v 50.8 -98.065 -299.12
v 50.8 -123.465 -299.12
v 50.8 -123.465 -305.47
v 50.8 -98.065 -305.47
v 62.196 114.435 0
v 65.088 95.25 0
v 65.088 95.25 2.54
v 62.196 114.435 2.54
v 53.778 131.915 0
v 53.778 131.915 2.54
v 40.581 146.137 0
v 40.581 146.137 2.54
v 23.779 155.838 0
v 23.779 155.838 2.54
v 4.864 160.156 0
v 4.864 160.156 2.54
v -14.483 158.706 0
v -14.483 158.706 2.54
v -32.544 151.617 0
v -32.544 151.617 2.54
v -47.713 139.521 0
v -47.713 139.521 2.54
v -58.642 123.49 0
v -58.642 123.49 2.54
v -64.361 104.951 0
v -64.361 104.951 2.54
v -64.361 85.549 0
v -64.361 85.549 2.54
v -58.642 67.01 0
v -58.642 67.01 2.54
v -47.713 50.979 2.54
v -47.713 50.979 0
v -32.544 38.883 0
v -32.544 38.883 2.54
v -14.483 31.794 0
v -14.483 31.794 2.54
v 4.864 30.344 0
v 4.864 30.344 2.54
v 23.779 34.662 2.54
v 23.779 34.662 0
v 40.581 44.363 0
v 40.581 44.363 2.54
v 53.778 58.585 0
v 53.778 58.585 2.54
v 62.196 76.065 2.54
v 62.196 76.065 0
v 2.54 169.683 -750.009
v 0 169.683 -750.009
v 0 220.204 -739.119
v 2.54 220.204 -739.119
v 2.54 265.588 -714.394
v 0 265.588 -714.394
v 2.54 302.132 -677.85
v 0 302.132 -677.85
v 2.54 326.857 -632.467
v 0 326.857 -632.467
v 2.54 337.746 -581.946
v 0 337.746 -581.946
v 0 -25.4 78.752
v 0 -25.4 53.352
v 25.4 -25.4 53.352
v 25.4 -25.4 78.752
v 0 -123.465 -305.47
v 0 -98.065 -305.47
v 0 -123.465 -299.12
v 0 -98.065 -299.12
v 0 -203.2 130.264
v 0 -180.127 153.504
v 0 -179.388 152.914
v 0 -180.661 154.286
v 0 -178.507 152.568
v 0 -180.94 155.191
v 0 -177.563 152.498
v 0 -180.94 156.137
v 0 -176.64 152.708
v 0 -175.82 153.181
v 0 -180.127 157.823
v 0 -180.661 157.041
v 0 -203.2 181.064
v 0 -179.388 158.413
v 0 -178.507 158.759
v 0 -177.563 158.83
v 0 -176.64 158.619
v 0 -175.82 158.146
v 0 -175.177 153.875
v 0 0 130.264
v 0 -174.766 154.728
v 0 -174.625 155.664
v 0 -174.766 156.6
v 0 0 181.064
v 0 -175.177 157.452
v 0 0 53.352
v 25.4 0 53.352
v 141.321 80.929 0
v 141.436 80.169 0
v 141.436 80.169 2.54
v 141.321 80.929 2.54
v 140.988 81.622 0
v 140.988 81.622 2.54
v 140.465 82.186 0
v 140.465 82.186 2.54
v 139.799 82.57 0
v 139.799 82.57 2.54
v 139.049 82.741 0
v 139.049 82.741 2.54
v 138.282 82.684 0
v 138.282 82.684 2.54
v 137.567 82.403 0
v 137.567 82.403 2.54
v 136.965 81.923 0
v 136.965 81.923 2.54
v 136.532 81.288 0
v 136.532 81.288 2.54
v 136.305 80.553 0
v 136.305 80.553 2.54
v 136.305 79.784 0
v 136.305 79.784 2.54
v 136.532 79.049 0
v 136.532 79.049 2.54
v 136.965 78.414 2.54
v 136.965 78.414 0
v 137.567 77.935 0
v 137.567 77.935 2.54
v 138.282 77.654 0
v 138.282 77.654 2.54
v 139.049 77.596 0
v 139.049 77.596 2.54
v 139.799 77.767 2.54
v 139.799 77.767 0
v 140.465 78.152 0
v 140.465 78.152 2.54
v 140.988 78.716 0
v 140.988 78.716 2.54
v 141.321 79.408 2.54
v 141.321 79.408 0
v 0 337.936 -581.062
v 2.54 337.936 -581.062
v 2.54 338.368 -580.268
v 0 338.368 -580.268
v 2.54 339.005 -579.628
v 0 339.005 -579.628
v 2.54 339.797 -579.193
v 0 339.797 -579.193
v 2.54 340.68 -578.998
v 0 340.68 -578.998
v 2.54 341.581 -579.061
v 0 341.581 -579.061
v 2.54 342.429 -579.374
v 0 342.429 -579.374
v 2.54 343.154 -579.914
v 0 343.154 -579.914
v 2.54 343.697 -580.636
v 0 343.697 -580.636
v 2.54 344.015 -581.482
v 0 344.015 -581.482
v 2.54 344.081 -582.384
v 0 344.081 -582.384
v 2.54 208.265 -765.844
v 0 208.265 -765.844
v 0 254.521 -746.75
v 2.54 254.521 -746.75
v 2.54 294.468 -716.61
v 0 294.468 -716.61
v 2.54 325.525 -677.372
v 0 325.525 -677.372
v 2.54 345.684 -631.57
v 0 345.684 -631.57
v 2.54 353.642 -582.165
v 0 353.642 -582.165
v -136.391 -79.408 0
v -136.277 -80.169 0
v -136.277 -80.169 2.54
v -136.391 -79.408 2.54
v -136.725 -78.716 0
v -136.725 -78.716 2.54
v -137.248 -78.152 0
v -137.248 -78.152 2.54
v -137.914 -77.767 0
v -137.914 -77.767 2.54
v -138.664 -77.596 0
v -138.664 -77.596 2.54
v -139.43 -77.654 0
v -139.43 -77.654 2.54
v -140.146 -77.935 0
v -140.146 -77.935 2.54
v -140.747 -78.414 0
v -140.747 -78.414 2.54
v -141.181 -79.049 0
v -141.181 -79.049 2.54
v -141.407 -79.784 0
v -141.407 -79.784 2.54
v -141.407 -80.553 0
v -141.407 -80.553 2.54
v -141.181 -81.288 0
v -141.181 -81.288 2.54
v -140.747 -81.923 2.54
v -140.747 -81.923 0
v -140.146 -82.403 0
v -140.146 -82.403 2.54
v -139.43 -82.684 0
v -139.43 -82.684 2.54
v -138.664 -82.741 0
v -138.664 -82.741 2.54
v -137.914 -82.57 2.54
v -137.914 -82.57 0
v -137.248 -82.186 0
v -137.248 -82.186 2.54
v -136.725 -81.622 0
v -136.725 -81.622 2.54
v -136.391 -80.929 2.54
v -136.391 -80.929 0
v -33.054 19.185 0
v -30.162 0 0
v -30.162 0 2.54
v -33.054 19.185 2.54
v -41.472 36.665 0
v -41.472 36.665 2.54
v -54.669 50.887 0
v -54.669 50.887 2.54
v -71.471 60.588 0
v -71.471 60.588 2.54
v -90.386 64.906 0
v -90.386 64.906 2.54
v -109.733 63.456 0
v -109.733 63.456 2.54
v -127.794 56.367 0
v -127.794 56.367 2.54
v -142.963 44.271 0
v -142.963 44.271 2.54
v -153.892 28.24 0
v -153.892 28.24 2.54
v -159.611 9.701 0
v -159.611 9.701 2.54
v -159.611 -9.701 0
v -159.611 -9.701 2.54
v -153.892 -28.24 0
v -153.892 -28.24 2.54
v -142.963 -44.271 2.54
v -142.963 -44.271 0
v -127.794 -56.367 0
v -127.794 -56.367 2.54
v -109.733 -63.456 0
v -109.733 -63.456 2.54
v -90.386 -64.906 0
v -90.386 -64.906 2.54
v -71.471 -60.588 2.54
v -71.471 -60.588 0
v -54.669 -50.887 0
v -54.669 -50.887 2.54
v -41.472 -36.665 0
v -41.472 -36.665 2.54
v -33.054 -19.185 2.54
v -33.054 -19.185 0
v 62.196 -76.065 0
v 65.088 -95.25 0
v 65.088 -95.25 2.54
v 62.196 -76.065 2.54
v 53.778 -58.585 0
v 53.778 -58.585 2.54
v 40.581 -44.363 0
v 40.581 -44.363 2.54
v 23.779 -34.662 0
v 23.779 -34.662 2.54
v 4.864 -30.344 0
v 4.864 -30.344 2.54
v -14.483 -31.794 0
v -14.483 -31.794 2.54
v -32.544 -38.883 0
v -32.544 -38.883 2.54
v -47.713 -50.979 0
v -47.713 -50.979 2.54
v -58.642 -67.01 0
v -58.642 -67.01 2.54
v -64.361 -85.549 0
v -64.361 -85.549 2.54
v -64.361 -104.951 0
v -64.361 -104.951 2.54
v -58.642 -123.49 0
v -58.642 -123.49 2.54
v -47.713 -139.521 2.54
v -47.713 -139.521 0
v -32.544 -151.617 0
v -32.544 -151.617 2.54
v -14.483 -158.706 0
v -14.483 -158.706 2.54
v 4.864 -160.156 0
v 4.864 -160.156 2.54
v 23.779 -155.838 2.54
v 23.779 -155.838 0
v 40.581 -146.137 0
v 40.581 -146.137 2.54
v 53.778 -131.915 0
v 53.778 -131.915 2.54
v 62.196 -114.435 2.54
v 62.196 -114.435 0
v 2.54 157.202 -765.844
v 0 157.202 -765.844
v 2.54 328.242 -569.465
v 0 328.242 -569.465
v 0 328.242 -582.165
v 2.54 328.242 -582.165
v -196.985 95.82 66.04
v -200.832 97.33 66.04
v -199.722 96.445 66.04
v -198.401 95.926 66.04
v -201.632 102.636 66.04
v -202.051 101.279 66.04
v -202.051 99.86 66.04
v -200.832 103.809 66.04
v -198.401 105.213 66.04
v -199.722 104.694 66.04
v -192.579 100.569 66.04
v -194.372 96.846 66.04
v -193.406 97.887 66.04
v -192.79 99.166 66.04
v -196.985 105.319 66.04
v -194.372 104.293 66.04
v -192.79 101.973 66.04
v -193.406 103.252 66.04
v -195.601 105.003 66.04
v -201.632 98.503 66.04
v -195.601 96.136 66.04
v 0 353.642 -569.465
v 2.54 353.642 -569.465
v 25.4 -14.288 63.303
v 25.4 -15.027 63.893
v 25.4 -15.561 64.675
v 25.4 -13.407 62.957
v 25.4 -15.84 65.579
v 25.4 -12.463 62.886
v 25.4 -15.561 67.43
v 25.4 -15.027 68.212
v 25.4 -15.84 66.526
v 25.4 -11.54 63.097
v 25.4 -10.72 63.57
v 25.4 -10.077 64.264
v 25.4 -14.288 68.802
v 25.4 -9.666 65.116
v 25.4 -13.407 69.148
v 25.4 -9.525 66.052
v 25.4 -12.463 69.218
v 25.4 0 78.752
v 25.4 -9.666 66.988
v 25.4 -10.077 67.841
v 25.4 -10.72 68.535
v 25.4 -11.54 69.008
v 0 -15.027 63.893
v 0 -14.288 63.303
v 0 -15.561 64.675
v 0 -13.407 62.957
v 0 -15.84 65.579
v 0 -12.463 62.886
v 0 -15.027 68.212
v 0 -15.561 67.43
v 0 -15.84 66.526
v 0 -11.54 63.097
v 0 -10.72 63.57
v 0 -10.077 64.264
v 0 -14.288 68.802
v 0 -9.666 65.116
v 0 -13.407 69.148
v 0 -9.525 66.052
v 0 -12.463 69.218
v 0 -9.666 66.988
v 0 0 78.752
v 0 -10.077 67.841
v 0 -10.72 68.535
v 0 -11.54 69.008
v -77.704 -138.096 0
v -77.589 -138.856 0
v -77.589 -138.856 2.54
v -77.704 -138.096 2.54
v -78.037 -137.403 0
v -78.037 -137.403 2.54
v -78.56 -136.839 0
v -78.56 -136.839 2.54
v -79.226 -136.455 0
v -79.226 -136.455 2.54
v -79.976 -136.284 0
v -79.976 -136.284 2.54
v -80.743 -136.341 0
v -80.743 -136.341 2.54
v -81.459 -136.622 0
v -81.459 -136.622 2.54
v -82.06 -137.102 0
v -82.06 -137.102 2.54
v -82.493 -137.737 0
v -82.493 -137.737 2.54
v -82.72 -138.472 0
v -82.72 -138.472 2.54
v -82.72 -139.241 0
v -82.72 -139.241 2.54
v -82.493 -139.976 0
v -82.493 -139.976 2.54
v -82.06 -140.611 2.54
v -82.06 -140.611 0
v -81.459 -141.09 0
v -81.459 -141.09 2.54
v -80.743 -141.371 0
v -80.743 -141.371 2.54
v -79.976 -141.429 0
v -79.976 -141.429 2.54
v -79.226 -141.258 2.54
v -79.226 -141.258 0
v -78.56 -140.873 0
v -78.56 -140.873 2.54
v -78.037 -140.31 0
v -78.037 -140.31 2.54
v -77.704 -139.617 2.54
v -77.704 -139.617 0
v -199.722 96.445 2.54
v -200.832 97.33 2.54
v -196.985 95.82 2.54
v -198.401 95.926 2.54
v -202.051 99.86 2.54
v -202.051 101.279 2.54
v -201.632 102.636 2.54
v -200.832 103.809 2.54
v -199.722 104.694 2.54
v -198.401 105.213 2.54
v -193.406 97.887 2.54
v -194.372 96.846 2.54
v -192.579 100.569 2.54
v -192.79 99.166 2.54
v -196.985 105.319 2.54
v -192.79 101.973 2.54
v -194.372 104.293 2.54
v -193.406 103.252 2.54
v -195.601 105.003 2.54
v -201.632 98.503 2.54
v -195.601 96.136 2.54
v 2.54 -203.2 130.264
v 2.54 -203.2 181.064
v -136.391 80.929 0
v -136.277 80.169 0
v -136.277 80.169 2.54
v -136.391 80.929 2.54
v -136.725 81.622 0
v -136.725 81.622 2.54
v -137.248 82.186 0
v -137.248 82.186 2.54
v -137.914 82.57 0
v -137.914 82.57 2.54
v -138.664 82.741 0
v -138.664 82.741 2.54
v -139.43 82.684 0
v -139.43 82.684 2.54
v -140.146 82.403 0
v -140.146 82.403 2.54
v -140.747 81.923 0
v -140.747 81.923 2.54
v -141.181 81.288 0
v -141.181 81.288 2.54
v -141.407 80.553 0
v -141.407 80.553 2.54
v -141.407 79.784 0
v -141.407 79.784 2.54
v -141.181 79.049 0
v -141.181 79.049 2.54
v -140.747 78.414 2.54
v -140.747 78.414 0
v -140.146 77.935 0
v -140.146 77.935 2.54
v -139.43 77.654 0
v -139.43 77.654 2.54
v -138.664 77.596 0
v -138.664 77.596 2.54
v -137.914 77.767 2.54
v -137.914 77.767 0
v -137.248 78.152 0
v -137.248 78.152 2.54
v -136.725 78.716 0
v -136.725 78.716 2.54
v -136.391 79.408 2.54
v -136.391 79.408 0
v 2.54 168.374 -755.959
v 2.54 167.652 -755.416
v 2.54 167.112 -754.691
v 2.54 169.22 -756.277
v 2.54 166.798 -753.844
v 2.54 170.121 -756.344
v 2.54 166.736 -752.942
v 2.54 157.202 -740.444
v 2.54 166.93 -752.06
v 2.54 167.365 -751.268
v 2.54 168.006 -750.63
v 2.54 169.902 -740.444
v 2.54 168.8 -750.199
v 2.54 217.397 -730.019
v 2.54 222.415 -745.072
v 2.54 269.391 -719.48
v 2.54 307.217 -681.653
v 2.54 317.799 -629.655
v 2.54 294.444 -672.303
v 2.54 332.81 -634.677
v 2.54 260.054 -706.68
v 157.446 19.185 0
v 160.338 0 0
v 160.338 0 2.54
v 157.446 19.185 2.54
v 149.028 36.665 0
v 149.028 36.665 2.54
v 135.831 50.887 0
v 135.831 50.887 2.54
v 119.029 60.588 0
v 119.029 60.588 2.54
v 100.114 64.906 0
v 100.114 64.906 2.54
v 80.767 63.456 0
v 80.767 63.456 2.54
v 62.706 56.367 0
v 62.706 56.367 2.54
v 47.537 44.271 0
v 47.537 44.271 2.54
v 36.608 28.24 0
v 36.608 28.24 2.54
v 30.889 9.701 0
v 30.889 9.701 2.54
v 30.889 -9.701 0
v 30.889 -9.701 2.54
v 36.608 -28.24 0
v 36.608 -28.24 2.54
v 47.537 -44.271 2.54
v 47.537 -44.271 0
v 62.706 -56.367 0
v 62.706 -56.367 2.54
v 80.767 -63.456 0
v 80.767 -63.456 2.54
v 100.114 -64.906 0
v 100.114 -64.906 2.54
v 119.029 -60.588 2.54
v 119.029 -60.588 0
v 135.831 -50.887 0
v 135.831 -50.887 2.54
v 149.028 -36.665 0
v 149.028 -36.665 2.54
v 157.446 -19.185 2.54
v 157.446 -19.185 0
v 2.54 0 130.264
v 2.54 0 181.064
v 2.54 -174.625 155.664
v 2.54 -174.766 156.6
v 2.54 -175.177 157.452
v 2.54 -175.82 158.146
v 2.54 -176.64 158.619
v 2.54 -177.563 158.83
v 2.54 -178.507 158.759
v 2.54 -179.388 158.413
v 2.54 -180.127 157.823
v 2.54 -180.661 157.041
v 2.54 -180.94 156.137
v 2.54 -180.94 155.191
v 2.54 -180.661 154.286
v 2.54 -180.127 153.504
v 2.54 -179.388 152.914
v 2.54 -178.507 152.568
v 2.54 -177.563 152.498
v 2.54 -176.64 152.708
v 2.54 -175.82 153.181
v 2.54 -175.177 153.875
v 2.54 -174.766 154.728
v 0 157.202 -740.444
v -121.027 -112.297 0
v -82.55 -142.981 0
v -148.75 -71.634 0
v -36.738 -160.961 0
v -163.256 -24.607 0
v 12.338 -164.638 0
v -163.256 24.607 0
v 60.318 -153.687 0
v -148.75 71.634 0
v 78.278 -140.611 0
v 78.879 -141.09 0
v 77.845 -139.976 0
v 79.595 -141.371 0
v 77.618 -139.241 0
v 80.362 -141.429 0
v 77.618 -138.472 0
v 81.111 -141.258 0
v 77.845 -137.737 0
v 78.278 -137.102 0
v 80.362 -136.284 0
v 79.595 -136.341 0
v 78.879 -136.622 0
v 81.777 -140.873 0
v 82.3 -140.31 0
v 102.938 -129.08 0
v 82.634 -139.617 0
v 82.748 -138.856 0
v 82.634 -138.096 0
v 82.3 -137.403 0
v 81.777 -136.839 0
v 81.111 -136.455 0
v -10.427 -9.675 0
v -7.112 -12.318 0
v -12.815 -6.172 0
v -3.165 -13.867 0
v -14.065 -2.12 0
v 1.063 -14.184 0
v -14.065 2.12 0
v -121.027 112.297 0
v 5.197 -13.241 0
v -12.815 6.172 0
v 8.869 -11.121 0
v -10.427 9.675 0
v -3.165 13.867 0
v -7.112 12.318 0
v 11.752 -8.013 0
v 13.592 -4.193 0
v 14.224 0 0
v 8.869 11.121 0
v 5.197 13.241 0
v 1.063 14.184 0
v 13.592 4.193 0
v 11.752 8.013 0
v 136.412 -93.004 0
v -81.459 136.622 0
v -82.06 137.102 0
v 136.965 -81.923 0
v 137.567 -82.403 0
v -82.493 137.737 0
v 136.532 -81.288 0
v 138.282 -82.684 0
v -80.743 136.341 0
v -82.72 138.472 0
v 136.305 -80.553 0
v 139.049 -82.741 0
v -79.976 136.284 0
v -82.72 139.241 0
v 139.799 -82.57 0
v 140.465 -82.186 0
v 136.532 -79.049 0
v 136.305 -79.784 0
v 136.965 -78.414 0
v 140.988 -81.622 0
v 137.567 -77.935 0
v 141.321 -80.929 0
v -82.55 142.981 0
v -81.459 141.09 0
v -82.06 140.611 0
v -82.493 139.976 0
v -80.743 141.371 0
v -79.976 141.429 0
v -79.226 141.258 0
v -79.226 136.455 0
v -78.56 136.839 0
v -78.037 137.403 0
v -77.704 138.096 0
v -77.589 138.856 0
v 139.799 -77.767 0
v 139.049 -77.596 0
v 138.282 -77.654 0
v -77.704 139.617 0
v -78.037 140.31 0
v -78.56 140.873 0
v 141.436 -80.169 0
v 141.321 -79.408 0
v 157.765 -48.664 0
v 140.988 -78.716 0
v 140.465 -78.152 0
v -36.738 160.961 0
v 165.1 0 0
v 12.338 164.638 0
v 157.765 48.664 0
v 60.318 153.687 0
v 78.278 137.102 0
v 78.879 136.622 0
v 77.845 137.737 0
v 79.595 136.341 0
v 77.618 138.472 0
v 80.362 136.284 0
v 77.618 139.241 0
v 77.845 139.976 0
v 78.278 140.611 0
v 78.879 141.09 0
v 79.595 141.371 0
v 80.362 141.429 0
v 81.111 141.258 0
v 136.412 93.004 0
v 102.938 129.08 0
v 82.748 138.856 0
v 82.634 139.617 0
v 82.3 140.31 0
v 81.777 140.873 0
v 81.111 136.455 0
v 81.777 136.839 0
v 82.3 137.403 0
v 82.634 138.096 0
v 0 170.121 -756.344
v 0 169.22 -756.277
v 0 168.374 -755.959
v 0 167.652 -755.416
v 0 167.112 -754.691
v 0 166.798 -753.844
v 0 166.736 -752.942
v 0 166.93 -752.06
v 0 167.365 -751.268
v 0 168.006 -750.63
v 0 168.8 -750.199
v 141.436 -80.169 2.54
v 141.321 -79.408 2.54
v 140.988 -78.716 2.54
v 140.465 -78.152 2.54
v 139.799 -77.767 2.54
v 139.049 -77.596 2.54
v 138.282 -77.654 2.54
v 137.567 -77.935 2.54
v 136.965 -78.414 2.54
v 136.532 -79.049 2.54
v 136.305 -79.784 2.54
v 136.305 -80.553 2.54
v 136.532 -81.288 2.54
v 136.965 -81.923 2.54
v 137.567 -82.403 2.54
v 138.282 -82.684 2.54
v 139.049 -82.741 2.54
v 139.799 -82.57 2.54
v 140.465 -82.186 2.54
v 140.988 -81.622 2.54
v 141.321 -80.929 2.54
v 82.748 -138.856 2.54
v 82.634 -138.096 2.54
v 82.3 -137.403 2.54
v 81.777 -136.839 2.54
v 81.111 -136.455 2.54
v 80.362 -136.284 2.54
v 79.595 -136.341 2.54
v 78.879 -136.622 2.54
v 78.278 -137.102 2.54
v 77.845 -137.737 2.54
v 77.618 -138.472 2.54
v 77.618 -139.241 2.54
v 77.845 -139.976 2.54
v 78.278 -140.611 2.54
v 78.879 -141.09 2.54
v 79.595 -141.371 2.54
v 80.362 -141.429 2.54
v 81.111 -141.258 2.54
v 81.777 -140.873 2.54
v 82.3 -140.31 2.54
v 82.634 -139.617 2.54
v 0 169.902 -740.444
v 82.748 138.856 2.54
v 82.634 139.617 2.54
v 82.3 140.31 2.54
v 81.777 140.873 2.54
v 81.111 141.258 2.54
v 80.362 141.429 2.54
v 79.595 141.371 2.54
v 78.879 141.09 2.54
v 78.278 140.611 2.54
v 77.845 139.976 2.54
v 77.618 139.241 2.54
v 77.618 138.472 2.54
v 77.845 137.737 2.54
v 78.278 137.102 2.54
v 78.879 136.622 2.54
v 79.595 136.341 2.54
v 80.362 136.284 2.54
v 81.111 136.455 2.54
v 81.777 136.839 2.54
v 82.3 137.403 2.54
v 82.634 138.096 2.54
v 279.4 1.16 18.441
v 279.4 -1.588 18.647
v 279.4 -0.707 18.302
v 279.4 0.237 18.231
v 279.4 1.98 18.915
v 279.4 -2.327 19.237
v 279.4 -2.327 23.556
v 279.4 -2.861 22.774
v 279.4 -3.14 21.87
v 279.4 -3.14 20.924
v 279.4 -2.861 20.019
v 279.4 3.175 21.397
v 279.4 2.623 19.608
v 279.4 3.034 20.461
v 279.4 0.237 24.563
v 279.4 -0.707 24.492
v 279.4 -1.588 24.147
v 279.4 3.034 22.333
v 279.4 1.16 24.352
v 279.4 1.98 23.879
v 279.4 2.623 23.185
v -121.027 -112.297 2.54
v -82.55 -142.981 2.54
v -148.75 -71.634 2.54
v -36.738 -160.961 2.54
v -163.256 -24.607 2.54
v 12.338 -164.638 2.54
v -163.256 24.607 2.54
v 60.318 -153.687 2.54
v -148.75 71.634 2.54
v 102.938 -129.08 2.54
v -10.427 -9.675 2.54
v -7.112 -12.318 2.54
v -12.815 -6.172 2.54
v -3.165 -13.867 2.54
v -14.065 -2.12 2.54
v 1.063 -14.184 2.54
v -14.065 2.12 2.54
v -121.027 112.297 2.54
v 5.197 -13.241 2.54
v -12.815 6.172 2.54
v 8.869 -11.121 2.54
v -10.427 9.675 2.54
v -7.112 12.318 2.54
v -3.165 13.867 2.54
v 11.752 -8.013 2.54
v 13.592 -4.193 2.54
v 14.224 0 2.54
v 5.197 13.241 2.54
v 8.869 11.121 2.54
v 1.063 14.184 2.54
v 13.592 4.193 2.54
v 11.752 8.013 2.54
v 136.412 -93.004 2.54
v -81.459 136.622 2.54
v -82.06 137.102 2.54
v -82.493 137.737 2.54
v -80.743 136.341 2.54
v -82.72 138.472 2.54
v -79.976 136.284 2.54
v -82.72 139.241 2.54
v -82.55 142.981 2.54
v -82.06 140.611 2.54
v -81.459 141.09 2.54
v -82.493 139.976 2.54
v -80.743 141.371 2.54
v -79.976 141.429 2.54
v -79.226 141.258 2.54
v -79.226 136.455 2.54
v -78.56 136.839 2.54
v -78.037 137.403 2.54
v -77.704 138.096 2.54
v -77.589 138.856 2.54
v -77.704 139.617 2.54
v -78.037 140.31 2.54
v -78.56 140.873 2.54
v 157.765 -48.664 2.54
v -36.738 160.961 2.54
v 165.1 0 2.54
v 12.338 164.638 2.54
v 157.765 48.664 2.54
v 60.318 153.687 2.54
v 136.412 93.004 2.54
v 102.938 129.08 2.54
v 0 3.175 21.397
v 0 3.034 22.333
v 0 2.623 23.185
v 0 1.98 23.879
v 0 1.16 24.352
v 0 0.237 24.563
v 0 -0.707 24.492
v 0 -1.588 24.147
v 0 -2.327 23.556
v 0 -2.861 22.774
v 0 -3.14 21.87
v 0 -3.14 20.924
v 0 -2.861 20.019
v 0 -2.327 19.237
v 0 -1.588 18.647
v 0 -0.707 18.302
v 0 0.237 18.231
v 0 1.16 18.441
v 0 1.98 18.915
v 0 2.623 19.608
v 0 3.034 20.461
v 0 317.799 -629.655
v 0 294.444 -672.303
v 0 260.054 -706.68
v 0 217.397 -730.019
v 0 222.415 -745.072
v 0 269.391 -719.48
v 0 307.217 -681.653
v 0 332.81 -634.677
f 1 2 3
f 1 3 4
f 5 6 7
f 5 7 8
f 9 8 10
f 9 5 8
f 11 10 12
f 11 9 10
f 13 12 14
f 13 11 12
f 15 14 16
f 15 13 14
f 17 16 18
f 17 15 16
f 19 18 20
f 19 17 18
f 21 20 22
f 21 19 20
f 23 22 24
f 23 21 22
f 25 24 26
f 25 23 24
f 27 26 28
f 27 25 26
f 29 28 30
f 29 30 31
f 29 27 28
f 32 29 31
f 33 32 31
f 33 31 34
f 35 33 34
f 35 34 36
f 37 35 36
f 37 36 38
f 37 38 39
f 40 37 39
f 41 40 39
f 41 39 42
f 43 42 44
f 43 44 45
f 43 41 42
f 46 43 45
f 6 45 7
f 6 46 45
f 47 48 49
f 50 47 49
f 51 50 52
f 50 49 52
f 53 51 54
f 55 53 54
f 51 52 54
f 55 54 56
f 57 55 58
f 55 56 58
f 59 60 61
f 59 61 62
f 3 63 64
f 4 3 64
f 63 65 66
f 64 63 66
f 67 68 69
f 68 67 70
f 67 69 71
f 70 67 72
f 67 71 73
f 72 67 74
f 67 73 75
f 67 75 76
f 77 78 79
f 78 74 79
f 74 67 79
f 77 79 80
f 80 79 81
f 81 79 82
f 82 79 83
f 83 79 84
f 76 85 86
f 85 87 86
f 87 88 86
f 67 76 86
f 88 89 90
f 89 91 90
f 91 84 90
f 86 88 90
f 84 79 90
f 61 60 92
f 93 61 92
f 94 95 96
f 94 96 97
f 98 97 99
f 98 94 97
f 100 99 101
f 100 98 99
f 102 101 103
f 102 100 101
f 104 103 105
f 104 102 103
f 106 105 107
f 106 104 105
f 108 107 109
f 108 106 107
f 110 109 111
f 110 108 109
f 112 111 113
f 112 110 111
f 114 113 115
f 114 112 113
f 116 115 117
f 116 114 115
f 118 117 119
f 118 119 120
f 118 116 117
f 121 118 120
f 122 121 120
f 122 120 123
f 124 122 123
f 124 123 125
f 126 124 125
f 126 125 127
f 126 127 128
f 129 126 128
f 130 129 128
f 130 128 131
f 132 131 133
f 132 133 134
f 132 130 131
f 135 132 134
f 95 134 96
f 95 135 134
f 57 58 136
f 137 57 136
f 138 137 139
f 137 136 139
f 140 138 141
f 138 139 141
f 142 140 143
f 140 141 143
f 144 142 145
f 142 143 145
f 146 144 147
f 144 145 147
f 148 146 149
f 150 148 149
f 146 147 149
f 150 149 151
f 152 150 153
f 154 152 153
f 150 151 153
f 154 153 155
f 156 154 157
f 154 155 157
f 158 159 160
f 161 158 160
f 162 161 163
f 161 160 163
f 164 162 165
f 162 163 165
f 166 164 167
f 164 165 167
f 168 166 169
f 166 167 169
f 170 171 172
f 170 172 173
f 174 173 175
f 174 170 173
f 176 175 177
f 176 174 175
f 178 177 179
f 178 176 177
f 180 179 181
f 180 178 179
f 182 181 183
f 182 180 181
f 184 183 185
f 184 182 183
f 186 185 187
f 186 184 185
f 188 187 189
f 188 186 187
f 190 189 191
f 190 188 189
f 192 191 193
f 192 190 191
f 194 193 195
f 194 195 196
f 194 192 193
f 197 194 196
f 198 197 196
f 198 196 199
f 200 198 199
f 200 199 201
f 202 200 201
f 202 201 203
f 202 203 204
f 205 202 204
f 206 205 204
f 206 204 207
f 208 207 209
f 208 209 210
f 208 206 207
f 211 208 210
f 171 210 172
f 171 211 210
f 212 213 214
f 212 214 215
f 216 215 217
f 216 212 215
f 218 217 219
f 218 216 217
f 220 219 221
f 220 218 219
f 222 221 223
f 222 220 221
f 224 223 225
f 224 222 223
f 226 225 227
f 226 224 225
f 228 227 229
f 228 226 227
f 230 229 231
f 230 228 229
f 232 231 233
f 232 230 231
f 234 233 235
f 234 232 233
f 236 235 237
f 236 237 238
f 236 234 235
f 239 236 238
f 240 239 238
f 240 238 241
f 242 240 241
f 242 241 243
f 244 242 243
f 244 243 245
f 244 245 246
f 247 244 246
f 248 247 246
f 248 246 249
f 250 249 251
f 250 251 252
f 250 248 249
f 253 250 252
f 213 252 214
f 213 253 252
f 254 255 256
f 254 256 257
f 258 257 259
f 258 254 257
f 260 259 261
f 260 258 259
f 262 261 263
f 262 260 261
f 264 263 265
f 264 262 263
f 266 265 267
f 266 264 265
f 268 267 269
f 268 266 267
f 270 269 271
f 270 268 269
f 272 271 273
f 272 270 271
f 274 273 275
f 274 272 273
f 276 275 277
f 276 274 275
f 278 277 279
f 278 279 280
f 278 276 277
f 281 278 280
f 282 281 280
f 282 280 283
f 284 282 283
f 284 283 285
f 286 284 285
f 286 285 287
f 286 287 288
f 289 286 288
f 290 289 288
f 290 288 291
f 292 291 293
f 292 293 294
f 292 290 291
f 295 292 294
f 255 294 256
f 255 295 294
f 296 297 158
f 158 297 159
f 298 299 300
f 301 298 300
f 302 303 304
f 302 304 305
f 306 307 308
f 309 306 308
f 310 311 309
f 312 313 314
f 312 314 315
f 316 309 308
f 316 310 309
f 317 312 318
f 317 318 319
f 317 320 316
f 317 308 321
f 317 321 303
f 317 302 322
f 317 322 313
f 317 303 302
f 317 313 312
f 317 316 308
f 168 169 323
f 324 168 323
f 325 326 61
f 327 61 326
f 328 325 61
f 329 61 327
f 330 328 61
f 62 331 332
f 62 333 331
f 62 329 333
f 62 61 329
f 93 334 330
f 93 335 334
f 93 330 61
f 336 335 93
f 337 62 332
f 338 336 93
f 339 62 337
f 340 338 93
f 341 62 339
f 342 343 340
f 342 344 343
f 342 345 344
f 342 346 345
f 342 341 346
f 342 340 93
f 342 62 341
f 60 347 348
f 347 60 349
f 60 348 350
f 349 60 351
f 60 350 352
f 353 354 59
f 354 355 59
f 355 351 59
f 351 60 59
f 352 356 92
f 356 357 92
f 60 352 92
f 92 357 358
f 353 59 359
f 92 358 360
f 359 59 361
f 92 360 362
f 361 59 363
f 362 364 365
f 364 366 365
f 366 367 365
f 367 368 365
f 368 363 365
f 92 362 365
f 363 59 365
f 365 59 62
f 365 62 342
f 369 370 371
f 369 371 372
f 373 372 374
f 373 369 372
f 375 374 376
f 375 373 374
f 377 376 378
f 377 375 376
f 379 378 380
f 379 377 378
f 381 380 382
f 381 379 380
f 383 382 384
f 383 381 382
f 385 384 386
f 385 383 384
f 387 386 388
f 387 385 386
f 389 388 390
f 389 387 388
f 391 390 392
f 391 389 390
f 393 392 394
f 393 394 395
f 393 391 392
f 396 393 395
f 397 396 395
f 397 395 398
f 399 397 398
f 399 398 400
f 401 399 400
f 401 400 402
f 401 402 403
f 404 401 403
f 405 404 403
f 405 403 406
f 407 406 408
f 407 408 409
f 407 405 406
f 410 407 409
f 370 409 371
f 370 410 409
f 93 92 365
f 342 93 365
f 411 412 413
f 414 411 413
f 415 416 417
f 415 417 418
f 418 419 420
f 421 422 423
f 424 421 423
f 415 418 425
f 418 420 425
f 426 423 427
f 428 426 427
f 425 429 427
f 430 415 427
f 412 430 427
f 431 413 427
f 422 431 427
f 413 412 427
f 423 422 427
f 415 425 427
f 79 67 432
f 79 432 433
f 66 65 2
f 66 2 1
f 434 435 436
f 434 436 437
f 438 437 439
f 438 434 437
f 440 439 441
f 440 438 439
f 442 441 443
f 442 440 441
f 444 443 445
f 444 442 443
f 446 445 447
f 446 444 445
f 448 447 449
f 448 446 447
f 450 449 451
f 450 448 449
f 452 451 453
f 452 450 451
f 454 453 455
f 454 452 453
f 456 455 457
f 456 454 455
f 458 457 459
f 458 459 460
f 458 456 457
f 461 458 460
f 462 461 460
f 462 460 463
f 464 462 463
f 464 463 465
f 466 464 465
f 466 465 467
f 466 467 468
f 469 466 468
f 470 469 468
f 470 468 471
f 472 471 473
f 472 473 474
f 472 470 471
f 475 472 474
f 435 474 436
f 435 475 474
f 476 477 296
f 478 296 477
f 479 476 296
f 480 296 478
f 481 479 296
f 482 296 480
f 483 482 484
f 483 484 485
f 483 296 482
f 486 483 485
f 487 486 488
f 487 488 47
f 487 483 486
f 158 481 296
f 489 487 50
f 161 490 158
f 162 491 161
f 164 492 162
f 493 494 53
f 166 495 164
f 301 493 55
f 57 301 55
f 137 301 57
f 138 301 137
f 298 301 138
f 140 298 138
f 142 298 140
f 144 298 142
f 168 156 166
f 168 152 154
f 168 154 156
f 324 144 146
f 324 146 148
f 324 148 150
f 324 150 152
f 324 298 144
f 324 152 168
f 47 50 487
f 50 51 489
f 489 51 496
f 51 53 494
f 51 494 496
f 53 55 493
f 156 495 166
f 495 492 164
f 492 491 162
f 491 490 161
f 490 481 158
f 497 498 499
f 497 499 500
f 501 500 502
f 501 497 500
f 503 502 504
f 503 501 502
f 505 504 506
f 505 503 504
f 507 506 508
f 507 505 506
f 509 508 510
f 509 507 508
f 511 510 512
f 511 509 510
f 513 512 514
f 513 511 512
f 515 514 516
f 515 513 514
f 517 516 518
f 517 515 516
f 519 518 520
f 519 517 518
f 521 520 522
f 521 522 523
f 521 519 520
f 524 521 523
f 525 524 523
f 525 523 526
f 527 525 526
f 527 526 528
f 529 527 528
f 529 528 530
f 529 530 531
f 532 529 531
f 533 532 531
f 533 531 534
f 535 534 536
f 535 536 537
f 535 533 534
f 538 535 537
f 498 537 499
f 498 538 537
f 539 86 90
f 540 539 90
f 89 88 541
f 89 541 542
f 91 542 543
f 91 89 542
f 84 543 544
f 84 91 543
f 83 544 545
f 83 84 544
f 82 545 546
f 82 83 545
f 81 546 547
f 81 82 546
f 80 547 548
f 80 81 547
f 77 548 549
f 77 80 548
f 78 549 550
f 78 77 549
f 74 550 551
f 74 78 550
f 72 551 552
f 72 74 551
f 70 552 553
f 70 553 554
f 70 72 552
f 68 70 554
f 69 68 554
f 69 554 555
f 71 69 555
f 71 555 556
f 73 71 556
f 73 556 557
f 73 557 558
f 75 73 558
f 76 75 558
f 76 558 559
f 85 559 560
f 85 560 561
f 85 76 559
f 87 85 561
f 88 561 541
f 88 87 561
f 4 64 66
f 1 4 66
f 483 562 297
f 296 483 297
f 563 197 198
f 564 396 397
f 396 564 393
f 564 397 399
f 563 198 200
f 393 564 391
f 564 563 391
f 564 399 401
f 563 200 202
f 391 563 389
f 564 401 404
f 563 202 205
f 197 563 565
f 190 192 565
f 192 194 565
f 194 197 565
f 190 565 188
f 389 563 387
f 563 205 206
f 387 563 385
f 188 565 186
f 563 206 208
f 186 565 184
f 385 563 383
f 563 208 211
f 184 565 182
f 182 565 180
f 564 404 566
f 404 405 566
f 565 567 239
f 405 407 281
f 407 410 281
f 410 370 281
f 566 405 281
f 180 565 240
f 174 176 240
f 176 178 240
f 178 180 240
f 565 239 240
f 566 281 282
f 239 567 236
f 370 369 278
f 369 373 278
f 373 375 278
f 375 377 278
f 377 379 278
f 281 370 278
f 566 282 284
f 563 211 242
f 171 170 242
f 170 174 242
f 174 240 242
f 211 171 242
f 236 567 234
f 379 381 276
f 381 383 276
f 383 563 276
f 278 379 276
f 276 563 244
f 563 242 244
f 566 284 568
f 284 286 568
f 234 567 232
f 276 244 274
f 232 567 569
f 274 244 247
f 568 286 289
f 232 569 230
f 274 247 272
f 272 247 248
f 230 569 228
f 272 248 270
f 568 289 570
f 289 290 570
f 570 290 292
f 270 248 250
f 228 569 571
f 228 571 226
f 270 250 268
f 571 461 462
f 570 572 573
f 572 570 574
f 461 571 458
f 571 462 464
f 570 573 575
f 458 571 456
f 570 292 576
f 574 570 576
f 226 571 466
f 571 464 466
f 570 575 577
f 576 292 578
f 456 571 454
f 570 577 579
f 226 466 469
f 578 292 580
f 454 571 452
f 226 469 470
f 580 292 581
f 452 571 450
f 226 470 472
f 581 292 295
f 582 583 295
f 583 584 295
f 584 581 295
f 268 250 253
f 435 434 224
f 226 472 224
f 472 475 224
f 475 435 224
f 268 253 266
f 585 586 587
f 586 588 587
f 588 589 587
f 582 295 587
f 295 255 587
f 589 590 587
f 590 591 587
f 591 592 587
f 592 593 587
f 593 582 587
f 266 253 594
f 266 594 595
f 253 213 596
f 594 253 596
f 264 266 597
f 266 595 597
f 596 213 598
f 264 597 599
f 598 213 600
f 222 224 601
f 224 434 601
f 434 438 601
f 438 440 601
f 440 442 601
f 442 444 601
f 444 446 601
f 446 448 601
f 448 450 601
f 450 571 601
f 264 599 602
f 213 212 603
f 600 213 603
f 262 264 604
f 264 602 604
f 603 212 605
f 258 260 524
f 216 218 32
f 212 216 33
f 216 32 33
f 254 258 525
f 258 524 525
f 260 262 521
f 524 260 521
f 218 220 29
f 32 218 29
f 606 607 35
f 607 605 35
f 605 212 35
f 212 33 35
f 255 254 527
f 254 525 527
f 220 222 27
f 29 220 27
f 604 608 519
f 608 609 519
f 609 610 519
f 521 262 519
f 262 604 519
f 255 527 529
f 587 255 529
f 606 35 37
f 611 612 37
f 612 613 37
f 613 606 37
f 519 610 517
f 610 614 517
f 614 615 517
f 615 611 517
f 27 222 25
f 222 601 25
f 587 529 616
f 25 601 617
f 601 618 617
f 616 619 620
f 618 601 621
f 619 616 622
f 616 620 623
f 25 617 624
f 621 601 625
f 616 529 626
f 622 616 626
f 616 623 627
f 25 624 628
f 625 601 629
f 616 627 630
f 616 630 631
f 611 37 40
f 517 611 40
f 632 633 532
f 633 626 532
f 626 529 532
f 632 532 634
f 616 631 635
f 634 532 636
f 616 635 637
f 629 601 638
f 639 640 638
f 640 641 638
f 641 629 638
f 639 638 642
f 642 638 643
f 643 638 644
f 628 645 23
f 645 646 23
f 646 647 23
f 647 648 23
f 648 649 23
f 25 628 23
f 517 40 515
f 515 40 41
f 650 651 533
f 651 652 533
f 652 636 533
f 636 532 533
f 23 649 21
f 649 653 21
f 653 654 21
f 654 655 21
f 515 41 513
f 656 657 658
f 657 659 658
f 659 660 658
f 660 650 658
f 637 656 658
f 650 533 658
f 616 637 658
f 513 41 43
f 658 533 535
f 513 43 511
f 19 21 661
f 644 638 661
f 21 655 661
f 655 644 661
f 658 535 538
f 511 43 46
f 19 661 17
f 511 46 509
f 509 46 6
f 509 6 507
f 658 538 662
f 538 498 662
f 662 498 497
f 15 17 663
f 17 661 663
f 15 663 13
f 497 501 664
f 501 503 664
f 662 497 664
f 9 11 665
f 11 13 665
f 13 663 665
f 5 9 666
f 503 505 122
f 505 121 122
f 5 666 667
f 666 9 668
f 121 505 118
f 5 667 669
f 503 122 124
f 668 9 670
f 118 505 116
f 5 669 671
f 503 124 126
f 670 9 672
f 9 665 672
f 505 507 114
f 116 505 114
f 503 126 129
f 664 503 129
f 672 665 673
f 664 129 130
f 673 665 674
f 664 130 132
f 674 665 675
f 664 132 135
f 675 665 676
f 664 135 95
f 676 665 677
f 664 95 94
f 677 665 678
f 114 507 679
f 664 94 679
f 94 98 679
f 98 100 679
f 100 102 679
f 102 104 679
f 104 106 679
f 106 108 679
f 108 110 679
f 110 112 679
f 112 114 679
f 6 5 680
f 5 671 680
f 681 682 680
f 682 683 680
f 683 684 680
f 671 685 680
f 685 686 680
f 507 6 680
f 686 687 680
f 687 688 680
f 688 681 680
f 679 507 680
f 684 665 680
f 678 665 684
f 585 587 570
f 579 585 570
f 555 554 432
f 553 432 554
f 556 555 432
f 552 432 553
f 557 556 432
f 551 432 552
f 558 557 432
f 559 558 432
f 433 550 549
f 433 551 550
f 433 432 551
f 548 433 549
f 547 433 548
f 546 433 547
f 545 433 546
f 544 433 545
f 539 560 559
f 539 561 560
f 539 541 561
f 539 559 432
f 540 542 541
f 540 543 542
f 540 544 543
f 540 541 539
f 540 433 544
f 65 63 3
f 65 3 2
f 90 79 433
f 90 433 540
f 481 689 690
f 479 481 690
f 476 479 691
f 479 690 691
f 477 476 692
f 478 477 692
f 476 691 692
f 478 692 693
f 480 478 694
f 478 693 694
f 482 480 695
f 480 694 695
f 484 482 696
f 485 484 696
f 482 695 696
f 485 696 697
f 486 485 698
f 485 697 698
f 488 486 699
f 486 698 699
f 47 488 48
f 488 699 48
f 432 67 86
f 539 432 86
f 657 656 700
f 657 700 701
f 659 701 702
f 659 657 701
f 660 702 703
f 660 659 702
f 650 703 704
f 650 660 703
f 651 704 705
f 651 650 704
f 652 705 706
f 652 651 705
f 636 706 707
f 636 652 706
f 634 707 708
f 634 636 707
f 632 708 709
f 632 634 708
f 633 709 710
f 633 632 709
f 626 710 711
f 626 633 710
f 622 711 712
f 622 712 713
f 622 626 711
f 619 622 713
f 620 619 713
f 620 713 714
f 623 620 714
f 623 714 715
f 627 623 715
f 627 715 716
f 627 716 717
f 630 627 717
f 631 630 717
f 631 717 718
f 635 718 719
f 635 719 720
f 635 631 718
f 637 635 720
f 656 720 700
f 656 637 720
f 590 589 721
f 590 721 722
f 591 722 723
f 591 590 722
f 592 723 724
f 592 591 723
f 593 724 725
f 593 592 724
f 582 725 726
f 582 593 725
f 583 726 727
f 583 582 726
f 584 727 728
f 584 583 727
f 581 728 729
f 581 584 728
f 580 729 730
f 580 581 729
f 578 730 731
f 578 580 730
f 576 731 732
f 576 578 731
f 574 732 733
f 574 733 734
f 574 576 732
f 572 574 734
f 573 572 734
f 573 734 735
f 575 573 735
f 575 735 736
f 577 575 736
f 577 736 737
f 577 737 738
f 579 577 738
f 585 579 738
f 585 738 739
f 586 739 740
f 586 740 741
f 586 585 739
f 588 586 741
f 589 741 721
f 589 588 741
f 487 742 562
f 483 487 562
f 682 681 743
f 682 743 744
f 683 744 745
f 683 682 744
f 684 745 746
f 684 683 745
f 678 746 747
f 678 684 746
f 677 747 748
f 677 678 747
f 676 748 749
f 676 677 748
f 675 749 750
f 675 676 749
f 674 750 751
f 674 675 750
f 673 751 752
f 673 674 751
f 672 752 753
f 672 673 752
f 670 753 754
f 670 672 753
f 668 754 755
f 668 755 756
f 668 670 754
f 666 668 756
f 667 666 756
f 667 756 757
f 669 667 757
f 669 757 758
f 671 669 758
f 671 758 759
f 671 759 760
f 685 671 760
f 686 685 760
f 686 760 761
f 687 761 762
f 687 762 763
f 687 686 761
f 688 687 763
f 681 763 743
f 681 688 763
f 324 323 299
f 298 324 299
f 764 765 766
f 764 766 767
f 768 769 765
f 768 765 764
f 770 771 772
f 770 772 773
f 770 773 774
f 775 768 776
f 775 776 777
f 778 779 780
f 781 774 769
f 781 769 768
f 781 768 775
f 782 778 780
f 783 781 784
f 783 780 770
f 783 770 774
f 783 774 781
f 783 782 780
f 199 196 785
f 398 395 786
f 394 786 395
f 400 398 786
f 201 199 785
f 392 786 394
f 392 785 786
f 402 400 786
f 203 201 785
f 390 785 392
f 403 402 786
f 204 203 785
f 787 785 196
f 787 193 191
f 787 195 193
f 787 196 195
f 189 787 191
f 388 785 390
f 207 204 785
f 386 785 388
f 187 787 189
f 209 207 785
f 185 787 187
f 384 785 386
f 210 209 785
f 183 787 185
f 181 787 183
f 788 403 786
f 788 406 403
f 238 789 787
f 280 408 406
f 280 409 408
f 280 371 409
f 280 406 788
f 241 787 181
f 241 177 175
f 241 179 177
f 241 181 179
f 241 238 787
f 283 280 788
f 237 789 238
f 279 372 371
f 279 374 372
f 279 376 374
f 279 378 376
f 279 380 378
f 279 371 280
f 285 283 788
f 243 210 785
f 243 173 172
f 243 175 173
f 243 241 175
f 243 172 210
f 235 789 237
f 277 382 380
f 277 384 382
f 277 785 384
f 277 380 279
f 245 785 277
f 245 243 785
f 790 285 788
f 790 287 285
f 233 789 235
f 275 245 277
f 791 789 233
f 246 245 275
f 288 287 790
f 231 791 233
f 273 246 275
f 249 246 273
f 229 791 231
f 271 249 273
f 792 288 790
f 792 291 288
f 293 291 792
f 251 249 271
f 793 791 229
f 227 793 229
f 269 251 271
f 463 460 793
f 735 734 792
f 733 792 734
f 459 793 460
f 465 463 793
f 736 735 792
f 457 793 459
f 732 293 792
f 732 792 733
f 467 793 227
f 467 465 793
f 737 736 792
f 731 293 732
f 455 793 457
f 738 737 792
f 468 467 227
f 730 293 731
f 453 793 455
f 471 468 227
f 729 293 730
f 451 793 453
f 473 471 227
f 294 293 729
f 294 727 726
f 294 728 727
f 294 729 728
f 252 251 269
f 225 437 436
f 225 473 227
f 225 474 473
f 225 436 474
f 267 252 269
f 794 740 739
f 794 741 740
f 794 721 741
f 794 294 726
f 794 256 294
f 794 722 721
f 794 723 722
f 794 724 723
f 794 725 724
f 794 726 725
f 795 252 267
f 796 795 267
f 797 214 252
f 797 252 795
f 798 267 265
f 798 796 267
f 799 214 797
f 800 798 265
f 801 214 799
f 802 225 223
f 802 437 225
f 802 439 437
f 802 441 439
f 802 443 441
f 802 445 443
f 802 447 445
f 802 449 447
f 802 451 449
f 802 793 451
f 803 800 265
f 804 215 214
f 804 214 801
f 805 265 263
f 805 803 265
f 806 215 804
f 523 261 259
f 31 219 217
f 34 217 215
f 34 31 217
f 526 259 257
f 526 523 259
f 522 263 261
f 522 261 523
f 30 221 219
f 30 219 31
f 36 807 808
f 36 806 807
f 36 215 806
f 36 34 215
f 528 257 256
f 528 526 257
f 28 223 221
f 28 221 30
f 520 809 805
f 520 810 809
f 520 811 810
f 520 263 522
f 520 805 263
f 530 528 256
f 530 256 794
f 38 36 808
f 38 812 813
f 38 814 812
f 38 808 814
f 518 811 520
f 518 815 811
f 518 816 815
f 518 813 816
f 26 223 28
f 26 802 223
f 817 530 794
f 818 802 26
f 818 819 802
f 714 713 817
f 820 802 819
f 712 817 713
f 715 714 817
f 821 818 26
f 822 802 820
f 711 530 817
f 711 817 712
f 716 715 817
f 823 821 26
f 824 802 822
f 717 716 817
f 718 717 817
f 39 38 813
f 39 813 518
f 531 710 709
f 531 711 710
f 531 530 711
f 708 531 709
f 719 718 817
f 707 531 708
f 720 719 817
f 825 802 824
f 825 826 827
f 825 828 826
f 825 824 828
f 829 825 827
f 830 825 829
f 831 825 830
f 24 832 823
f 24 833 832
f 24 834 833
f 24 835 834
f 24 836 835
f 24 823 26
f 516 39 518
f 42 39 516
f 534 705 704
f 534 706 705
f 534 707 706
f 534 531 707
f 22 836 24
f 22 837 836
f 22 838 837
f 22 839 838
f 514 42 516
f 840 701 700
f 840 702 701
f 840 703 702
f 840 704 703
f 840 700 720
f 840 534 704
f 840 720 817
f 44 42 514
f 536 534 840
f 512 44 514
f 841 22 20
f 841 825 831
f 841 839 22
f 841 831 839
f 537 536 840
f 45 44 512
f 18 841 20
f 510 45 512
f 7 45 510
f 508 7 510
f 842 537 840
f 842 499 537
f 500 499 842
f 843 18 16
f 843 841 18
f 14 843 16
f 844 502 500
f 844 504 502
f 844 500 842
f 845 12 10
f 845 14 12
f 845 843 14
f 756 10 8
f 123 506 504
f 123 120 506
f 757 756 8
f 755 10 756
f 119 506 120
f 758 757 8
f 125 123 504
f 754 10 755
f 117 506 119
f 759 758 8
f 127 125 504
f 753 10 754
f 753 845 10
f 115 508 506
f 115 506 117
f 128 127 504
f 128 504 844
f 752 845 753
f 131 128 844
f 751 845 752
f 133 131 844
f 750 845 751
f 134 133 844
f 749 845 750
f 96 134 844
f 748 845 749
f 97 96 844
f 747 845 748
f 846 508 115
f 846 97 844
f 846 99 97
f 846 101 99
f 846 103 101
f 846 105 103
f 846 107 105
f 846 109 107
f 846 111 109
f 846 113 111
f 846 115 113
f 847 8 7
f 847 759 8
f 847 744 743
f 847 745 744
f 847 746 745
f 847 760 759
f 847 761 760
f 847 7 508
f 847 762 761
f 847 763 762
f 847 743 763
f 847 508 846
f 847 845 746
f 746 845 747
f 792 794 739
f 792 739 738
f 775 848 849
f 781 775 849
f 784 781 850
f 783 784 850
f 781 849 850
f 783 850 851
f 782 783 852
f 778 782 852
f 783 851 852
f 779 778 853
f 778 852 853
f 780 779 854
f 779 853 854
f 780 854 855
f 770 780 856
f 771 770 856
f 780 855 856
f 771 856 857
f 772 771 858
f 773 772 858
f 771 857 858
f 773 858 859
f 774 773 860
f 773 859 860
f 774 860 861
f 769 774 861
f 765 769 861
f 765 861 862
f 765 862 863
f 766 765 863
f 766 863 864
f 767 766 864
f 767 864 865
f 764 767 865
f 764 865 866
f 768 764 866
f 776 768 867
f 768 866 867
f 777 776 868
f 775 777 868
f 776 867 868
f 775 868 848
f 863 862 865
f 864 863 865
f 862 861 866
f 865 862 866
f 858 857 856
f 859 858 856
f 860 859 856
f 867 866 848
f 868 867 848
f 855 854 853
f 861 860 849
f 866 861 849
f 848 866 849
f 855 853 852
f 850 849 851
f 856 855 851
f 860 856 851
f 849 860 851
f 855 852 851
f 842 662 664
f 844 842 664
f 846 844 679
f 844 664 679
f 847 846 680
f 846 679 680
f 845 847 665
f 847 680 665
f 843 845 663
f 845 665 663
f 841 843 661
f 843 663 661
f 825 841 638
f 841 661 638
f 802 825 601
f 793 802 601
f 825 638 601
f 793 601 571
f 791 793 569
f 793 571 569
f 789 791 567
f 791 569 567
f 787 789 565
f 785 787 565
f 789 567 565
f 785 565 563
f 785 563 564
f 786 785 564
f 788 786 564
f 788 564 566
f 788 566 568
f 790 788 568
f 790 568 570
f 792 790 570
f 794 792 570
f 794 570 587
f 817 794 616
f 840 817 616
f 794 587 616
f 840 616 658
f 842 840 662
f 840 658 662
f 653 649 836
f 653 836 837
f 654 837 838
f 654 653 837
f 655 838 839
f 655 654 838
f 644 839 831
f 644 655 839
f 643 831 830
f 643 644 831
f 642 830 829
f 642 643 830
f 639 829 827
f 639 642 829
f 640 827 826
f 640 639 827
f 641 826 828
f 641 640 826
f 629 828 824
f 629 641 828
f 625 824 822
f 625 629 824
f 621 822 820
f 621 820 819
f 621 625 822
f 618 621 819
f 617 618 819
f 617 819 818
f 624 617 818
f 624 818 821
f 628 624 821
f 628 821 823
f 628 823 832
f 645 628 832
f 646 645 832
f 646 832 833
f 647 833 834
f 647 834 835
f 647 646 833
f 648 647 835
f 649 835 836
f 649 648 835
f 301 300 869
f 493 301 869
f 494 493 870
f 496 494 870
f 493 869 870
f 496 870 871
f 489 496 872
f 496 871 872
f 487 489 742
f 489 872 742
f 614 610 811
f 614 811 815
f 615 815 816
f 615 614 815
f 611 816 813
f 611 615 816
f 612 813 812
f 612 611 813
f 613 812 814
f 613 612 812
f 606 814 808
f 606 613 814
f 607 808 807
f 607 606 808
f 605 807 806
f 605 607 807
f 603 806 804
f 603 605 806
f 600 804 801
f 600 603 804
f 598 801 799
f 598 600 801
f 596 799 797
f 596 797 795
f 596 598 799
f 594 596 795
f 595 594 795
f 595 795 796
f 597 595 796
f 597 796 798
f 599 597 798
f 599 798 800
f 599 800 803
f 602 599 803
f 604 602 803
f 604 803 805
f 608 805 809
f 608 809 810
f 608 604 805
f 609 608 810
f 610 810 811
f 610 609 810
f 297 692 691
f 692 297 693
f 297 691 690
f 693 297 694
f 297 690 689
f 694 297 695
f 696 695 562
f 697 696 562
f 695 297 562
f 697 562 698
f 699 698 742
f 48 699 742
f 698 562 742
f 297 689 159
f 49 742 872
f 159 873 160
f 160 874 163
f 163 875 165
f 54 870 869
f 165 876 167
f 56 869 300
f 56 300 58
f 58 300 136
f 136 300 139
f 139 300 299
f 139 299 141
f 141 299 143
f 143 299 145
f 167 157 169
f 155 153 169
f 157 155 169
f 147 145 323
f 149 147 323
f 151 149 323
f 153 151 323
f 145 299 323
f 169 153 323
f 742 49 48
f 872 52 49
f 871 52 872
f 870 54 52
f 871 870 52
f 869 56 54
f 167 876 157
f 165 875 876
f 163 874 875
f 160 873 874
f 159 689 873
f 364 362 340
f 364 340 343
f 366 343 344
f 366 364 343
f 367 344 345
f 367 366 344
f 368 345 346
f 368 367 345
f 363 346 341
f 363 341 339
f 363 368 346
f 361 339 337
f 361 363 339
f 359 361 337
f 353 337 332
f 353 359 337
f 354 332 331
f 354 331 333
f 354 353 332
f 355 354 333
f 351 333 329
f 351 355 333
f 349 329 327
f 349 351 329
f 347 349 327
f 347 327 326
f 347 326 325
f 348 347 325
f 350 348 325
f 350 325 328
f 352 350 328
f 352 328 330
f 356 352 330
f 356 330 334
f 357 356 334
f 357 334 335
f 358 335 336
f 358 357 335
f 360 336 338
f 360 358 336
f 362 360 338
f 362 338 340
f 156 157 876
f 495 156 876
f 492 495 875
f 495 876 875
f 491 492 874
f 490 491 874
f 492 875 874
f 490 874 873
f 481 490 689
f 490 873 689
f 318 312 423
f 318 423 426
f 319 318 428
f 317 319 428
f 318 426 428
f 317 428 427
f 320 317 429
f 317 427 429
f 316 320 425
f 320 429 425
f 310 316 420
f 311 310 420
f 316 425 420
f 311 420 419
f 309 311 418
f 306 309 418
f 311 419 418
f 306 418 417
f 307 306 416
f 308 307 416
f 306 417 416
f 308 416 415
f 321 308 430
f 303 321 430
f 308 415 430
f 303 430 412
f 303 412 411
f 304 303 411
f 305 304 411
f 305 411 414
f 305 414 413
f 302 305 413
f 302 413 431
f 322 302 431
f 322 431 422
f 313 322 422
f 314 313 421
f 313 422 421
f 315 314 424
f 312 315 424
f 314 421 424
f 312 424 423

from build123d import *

# Parameters (mm, degrees)
F0_R      = 165.1
F0_R_2    = 2.5796875
F0_R_3    = 65.0875
F0_R_4    = 14.224
F1_DEPTH  = 2.54
F2_R      = 4.7625
F3_DEPTH  = 63.5
F4_W      = 203.2
F4_H      = 50.8
F4_R      = 3.175
F5_DEPTH  = 2.54
F6_R      = 3.175
F7_DEPTH  = 279.4
F8_W      = 25.4
F8_H      = 25.4
F8_R      = 3.175
F9_DEPTH  = 25.4
F11_DEPTH = 2.54
F12_W     = 25.4
F12_H     = 6.35
F13_DEPTH = 50.8


with BuildPart() as f1:
    # F0 (on Top) → F1 (new body)
    with BuildSketch(Plane.XY):
        Circle(F0_R)
        with Locations((-80.16875, -138.8563481793)):
            Circle(F0_R_2, mode=Mode.SUBTRACT)
        with Locations((-138.8563481793, -80.16875)):
            Circle(F0_R_2, mode=Mode.SUBTRACT)
        with Locations((80.16875, -138.8563481793)):
            Circle(F0_R_2, mode=Mode.SUBTRACT)
        with Locations((0, -95.25)):
            Circle(F0_R_3, mode=Mode.SUBTRACT)
        with Locations((138.8563481793, -80.16875)):
            Circle(F0_R_2, mode=Mode.SUBTRACT)
        with Locations((-95.25, 0)):
            Circle(F0_R_3, mode=Mode.SUBTRACT)
        with Locations((-138.8563481793, 80.16875)):
            Circle(F0_R_2, mode=Mode.SUBTRACT)
        with Locations((-80.16875, 138.8563481793)):
            Circle(F0_R_2, mode=Mode.SUBTRACT)
        Circle(F0_R_4, mode=Mode.SUBTRACT)
        with Locations((95.25, 0)):
            Circle(F0_R_3, mode=Mode.SUBTRACT)
        with Locations((138.8563481793, 80.16875)):
            Circle(F0_R_2, mode=Mode.SUBTRACT)
        with Locations((0, 95.25)):
            Circle(F0_R_3, mode=Mode.SUBTRACT)
        with Locations((80.16875, 138.8563481793)):
            Circle(F0_R_2, mode=Mode.SUBTRACT)
    extrude(amount=F1_DEPTH)


with BuildPart() as f3:
    # F2 (on face) → F3 (new body)
    with BuildSketch(Plane.XY.offset(2.54)):
        with Locations((-197.3412185907, 100.5694940686)):
            Circle(F2_R)
    extrude(amount=F3_DEPTH)


with BuildPart() as f5:
    # F4 (on Right) → F5 (new body)
    with BuildSketch(Plane.YZ):
        with Locations((-101.6, 155.6637153042)):
            Rectangle(F4_W, F4_H)
        with Locations((-177.8, 155.6637153042)):
            Circle(F4_R, mode=Mode.SUBTRACT)
    extrude(amount=F5_DEPTH)


with BuildPart() as f7:
    # F6 (on Right) → F7 (new body)
    with BuildSketch(Plane.YZ):
        with Locations((0, 21.3969157429)):
            Circle(F6_R)
    extrude(amount=F7_DEPTH)


with BuildPart() as f9:
    # F8 (on Right) → F9 (new body)
    with BuildSketch(Plane.YZ):
        with Locations((-12.7, 66.0523111046)):
            Rectangle(F8_W, F8_H)
        with Locations((-12.7, 66.0523111046)):
            Circle(F8_R, mode=Mode.SUBTRACT)
    extrude(amount=F9_DEPTH)


with BuildPart() as f11:
    # F10 (on Right) → F11 (new body)
    with BuildSketch(Plane.YZ):
        with BuildLine():
            Line((353.6422328556, -569.4647138109), (328.2422328556, -569.4647138109))
            Line((328.2422328556, -569.4647138109), (328.2422328556, -582.1647138109))
            ThreePointArc((328.2422328556, -582.1647138109), (278.4737192788, -690.7169542151), (169.9023374678, -740.4436964374))
            Line((169.9023374678, -740.4436964374), (157.2023374678, -740.4436964374))
            Line((157.2023374678, -740.4436964374), (157.2023374678, -765.8436964374))
            Line((157.2023374678, -765.8436964374), (208.2649841227, -765.8436964374))
            ThreePointArc((208.2649841227, -765.8436964374), (311.2485261911, -697.9818629004), (353.6422328556, -582.1647138109))
            Line((353.6422328556, -582.1647138109), (353.6422328556, -569.4647138109))
        make_face()
        with BuildLine():
            ThreePointArc((337.7464439992, -581.9457482937), (341.1328499819, -578.9972733454), (344.0813249301, -582.3836793281))
            ThreePointArc((344.0813249301, -582.3836793281), (289.6611152535, -701.9234915967), (170.121302985, -756.3437012733))
            ThreePointArc((170.121302985, -756.3437012733), (166.7348970023, -753.3952263251), (169.6833719505, -750.0088203424))
            ThreePointArc((169.6833719505, -750.0088203424), (285.170987193, -697.4333635361), (337.7464439992, -581.9457482937))
        make_face(mode=Mode.SUBTRACT)
    extrude(amount=F11_DEPTH)


with BuildPart() as f13:
    # F12 (on Right) → F13 (new body)
    with BuildSketch(Plane.YZ):
        with Locations((-110.764503479, -302.2948301549)):
            Rectangle(F12_W, F12_H)
    extrude(amount=F13_DEPTH)


solid = Compound([f1.part, f3.part, f5.part, f7.part, f9.part, f11.part, f13.part])
